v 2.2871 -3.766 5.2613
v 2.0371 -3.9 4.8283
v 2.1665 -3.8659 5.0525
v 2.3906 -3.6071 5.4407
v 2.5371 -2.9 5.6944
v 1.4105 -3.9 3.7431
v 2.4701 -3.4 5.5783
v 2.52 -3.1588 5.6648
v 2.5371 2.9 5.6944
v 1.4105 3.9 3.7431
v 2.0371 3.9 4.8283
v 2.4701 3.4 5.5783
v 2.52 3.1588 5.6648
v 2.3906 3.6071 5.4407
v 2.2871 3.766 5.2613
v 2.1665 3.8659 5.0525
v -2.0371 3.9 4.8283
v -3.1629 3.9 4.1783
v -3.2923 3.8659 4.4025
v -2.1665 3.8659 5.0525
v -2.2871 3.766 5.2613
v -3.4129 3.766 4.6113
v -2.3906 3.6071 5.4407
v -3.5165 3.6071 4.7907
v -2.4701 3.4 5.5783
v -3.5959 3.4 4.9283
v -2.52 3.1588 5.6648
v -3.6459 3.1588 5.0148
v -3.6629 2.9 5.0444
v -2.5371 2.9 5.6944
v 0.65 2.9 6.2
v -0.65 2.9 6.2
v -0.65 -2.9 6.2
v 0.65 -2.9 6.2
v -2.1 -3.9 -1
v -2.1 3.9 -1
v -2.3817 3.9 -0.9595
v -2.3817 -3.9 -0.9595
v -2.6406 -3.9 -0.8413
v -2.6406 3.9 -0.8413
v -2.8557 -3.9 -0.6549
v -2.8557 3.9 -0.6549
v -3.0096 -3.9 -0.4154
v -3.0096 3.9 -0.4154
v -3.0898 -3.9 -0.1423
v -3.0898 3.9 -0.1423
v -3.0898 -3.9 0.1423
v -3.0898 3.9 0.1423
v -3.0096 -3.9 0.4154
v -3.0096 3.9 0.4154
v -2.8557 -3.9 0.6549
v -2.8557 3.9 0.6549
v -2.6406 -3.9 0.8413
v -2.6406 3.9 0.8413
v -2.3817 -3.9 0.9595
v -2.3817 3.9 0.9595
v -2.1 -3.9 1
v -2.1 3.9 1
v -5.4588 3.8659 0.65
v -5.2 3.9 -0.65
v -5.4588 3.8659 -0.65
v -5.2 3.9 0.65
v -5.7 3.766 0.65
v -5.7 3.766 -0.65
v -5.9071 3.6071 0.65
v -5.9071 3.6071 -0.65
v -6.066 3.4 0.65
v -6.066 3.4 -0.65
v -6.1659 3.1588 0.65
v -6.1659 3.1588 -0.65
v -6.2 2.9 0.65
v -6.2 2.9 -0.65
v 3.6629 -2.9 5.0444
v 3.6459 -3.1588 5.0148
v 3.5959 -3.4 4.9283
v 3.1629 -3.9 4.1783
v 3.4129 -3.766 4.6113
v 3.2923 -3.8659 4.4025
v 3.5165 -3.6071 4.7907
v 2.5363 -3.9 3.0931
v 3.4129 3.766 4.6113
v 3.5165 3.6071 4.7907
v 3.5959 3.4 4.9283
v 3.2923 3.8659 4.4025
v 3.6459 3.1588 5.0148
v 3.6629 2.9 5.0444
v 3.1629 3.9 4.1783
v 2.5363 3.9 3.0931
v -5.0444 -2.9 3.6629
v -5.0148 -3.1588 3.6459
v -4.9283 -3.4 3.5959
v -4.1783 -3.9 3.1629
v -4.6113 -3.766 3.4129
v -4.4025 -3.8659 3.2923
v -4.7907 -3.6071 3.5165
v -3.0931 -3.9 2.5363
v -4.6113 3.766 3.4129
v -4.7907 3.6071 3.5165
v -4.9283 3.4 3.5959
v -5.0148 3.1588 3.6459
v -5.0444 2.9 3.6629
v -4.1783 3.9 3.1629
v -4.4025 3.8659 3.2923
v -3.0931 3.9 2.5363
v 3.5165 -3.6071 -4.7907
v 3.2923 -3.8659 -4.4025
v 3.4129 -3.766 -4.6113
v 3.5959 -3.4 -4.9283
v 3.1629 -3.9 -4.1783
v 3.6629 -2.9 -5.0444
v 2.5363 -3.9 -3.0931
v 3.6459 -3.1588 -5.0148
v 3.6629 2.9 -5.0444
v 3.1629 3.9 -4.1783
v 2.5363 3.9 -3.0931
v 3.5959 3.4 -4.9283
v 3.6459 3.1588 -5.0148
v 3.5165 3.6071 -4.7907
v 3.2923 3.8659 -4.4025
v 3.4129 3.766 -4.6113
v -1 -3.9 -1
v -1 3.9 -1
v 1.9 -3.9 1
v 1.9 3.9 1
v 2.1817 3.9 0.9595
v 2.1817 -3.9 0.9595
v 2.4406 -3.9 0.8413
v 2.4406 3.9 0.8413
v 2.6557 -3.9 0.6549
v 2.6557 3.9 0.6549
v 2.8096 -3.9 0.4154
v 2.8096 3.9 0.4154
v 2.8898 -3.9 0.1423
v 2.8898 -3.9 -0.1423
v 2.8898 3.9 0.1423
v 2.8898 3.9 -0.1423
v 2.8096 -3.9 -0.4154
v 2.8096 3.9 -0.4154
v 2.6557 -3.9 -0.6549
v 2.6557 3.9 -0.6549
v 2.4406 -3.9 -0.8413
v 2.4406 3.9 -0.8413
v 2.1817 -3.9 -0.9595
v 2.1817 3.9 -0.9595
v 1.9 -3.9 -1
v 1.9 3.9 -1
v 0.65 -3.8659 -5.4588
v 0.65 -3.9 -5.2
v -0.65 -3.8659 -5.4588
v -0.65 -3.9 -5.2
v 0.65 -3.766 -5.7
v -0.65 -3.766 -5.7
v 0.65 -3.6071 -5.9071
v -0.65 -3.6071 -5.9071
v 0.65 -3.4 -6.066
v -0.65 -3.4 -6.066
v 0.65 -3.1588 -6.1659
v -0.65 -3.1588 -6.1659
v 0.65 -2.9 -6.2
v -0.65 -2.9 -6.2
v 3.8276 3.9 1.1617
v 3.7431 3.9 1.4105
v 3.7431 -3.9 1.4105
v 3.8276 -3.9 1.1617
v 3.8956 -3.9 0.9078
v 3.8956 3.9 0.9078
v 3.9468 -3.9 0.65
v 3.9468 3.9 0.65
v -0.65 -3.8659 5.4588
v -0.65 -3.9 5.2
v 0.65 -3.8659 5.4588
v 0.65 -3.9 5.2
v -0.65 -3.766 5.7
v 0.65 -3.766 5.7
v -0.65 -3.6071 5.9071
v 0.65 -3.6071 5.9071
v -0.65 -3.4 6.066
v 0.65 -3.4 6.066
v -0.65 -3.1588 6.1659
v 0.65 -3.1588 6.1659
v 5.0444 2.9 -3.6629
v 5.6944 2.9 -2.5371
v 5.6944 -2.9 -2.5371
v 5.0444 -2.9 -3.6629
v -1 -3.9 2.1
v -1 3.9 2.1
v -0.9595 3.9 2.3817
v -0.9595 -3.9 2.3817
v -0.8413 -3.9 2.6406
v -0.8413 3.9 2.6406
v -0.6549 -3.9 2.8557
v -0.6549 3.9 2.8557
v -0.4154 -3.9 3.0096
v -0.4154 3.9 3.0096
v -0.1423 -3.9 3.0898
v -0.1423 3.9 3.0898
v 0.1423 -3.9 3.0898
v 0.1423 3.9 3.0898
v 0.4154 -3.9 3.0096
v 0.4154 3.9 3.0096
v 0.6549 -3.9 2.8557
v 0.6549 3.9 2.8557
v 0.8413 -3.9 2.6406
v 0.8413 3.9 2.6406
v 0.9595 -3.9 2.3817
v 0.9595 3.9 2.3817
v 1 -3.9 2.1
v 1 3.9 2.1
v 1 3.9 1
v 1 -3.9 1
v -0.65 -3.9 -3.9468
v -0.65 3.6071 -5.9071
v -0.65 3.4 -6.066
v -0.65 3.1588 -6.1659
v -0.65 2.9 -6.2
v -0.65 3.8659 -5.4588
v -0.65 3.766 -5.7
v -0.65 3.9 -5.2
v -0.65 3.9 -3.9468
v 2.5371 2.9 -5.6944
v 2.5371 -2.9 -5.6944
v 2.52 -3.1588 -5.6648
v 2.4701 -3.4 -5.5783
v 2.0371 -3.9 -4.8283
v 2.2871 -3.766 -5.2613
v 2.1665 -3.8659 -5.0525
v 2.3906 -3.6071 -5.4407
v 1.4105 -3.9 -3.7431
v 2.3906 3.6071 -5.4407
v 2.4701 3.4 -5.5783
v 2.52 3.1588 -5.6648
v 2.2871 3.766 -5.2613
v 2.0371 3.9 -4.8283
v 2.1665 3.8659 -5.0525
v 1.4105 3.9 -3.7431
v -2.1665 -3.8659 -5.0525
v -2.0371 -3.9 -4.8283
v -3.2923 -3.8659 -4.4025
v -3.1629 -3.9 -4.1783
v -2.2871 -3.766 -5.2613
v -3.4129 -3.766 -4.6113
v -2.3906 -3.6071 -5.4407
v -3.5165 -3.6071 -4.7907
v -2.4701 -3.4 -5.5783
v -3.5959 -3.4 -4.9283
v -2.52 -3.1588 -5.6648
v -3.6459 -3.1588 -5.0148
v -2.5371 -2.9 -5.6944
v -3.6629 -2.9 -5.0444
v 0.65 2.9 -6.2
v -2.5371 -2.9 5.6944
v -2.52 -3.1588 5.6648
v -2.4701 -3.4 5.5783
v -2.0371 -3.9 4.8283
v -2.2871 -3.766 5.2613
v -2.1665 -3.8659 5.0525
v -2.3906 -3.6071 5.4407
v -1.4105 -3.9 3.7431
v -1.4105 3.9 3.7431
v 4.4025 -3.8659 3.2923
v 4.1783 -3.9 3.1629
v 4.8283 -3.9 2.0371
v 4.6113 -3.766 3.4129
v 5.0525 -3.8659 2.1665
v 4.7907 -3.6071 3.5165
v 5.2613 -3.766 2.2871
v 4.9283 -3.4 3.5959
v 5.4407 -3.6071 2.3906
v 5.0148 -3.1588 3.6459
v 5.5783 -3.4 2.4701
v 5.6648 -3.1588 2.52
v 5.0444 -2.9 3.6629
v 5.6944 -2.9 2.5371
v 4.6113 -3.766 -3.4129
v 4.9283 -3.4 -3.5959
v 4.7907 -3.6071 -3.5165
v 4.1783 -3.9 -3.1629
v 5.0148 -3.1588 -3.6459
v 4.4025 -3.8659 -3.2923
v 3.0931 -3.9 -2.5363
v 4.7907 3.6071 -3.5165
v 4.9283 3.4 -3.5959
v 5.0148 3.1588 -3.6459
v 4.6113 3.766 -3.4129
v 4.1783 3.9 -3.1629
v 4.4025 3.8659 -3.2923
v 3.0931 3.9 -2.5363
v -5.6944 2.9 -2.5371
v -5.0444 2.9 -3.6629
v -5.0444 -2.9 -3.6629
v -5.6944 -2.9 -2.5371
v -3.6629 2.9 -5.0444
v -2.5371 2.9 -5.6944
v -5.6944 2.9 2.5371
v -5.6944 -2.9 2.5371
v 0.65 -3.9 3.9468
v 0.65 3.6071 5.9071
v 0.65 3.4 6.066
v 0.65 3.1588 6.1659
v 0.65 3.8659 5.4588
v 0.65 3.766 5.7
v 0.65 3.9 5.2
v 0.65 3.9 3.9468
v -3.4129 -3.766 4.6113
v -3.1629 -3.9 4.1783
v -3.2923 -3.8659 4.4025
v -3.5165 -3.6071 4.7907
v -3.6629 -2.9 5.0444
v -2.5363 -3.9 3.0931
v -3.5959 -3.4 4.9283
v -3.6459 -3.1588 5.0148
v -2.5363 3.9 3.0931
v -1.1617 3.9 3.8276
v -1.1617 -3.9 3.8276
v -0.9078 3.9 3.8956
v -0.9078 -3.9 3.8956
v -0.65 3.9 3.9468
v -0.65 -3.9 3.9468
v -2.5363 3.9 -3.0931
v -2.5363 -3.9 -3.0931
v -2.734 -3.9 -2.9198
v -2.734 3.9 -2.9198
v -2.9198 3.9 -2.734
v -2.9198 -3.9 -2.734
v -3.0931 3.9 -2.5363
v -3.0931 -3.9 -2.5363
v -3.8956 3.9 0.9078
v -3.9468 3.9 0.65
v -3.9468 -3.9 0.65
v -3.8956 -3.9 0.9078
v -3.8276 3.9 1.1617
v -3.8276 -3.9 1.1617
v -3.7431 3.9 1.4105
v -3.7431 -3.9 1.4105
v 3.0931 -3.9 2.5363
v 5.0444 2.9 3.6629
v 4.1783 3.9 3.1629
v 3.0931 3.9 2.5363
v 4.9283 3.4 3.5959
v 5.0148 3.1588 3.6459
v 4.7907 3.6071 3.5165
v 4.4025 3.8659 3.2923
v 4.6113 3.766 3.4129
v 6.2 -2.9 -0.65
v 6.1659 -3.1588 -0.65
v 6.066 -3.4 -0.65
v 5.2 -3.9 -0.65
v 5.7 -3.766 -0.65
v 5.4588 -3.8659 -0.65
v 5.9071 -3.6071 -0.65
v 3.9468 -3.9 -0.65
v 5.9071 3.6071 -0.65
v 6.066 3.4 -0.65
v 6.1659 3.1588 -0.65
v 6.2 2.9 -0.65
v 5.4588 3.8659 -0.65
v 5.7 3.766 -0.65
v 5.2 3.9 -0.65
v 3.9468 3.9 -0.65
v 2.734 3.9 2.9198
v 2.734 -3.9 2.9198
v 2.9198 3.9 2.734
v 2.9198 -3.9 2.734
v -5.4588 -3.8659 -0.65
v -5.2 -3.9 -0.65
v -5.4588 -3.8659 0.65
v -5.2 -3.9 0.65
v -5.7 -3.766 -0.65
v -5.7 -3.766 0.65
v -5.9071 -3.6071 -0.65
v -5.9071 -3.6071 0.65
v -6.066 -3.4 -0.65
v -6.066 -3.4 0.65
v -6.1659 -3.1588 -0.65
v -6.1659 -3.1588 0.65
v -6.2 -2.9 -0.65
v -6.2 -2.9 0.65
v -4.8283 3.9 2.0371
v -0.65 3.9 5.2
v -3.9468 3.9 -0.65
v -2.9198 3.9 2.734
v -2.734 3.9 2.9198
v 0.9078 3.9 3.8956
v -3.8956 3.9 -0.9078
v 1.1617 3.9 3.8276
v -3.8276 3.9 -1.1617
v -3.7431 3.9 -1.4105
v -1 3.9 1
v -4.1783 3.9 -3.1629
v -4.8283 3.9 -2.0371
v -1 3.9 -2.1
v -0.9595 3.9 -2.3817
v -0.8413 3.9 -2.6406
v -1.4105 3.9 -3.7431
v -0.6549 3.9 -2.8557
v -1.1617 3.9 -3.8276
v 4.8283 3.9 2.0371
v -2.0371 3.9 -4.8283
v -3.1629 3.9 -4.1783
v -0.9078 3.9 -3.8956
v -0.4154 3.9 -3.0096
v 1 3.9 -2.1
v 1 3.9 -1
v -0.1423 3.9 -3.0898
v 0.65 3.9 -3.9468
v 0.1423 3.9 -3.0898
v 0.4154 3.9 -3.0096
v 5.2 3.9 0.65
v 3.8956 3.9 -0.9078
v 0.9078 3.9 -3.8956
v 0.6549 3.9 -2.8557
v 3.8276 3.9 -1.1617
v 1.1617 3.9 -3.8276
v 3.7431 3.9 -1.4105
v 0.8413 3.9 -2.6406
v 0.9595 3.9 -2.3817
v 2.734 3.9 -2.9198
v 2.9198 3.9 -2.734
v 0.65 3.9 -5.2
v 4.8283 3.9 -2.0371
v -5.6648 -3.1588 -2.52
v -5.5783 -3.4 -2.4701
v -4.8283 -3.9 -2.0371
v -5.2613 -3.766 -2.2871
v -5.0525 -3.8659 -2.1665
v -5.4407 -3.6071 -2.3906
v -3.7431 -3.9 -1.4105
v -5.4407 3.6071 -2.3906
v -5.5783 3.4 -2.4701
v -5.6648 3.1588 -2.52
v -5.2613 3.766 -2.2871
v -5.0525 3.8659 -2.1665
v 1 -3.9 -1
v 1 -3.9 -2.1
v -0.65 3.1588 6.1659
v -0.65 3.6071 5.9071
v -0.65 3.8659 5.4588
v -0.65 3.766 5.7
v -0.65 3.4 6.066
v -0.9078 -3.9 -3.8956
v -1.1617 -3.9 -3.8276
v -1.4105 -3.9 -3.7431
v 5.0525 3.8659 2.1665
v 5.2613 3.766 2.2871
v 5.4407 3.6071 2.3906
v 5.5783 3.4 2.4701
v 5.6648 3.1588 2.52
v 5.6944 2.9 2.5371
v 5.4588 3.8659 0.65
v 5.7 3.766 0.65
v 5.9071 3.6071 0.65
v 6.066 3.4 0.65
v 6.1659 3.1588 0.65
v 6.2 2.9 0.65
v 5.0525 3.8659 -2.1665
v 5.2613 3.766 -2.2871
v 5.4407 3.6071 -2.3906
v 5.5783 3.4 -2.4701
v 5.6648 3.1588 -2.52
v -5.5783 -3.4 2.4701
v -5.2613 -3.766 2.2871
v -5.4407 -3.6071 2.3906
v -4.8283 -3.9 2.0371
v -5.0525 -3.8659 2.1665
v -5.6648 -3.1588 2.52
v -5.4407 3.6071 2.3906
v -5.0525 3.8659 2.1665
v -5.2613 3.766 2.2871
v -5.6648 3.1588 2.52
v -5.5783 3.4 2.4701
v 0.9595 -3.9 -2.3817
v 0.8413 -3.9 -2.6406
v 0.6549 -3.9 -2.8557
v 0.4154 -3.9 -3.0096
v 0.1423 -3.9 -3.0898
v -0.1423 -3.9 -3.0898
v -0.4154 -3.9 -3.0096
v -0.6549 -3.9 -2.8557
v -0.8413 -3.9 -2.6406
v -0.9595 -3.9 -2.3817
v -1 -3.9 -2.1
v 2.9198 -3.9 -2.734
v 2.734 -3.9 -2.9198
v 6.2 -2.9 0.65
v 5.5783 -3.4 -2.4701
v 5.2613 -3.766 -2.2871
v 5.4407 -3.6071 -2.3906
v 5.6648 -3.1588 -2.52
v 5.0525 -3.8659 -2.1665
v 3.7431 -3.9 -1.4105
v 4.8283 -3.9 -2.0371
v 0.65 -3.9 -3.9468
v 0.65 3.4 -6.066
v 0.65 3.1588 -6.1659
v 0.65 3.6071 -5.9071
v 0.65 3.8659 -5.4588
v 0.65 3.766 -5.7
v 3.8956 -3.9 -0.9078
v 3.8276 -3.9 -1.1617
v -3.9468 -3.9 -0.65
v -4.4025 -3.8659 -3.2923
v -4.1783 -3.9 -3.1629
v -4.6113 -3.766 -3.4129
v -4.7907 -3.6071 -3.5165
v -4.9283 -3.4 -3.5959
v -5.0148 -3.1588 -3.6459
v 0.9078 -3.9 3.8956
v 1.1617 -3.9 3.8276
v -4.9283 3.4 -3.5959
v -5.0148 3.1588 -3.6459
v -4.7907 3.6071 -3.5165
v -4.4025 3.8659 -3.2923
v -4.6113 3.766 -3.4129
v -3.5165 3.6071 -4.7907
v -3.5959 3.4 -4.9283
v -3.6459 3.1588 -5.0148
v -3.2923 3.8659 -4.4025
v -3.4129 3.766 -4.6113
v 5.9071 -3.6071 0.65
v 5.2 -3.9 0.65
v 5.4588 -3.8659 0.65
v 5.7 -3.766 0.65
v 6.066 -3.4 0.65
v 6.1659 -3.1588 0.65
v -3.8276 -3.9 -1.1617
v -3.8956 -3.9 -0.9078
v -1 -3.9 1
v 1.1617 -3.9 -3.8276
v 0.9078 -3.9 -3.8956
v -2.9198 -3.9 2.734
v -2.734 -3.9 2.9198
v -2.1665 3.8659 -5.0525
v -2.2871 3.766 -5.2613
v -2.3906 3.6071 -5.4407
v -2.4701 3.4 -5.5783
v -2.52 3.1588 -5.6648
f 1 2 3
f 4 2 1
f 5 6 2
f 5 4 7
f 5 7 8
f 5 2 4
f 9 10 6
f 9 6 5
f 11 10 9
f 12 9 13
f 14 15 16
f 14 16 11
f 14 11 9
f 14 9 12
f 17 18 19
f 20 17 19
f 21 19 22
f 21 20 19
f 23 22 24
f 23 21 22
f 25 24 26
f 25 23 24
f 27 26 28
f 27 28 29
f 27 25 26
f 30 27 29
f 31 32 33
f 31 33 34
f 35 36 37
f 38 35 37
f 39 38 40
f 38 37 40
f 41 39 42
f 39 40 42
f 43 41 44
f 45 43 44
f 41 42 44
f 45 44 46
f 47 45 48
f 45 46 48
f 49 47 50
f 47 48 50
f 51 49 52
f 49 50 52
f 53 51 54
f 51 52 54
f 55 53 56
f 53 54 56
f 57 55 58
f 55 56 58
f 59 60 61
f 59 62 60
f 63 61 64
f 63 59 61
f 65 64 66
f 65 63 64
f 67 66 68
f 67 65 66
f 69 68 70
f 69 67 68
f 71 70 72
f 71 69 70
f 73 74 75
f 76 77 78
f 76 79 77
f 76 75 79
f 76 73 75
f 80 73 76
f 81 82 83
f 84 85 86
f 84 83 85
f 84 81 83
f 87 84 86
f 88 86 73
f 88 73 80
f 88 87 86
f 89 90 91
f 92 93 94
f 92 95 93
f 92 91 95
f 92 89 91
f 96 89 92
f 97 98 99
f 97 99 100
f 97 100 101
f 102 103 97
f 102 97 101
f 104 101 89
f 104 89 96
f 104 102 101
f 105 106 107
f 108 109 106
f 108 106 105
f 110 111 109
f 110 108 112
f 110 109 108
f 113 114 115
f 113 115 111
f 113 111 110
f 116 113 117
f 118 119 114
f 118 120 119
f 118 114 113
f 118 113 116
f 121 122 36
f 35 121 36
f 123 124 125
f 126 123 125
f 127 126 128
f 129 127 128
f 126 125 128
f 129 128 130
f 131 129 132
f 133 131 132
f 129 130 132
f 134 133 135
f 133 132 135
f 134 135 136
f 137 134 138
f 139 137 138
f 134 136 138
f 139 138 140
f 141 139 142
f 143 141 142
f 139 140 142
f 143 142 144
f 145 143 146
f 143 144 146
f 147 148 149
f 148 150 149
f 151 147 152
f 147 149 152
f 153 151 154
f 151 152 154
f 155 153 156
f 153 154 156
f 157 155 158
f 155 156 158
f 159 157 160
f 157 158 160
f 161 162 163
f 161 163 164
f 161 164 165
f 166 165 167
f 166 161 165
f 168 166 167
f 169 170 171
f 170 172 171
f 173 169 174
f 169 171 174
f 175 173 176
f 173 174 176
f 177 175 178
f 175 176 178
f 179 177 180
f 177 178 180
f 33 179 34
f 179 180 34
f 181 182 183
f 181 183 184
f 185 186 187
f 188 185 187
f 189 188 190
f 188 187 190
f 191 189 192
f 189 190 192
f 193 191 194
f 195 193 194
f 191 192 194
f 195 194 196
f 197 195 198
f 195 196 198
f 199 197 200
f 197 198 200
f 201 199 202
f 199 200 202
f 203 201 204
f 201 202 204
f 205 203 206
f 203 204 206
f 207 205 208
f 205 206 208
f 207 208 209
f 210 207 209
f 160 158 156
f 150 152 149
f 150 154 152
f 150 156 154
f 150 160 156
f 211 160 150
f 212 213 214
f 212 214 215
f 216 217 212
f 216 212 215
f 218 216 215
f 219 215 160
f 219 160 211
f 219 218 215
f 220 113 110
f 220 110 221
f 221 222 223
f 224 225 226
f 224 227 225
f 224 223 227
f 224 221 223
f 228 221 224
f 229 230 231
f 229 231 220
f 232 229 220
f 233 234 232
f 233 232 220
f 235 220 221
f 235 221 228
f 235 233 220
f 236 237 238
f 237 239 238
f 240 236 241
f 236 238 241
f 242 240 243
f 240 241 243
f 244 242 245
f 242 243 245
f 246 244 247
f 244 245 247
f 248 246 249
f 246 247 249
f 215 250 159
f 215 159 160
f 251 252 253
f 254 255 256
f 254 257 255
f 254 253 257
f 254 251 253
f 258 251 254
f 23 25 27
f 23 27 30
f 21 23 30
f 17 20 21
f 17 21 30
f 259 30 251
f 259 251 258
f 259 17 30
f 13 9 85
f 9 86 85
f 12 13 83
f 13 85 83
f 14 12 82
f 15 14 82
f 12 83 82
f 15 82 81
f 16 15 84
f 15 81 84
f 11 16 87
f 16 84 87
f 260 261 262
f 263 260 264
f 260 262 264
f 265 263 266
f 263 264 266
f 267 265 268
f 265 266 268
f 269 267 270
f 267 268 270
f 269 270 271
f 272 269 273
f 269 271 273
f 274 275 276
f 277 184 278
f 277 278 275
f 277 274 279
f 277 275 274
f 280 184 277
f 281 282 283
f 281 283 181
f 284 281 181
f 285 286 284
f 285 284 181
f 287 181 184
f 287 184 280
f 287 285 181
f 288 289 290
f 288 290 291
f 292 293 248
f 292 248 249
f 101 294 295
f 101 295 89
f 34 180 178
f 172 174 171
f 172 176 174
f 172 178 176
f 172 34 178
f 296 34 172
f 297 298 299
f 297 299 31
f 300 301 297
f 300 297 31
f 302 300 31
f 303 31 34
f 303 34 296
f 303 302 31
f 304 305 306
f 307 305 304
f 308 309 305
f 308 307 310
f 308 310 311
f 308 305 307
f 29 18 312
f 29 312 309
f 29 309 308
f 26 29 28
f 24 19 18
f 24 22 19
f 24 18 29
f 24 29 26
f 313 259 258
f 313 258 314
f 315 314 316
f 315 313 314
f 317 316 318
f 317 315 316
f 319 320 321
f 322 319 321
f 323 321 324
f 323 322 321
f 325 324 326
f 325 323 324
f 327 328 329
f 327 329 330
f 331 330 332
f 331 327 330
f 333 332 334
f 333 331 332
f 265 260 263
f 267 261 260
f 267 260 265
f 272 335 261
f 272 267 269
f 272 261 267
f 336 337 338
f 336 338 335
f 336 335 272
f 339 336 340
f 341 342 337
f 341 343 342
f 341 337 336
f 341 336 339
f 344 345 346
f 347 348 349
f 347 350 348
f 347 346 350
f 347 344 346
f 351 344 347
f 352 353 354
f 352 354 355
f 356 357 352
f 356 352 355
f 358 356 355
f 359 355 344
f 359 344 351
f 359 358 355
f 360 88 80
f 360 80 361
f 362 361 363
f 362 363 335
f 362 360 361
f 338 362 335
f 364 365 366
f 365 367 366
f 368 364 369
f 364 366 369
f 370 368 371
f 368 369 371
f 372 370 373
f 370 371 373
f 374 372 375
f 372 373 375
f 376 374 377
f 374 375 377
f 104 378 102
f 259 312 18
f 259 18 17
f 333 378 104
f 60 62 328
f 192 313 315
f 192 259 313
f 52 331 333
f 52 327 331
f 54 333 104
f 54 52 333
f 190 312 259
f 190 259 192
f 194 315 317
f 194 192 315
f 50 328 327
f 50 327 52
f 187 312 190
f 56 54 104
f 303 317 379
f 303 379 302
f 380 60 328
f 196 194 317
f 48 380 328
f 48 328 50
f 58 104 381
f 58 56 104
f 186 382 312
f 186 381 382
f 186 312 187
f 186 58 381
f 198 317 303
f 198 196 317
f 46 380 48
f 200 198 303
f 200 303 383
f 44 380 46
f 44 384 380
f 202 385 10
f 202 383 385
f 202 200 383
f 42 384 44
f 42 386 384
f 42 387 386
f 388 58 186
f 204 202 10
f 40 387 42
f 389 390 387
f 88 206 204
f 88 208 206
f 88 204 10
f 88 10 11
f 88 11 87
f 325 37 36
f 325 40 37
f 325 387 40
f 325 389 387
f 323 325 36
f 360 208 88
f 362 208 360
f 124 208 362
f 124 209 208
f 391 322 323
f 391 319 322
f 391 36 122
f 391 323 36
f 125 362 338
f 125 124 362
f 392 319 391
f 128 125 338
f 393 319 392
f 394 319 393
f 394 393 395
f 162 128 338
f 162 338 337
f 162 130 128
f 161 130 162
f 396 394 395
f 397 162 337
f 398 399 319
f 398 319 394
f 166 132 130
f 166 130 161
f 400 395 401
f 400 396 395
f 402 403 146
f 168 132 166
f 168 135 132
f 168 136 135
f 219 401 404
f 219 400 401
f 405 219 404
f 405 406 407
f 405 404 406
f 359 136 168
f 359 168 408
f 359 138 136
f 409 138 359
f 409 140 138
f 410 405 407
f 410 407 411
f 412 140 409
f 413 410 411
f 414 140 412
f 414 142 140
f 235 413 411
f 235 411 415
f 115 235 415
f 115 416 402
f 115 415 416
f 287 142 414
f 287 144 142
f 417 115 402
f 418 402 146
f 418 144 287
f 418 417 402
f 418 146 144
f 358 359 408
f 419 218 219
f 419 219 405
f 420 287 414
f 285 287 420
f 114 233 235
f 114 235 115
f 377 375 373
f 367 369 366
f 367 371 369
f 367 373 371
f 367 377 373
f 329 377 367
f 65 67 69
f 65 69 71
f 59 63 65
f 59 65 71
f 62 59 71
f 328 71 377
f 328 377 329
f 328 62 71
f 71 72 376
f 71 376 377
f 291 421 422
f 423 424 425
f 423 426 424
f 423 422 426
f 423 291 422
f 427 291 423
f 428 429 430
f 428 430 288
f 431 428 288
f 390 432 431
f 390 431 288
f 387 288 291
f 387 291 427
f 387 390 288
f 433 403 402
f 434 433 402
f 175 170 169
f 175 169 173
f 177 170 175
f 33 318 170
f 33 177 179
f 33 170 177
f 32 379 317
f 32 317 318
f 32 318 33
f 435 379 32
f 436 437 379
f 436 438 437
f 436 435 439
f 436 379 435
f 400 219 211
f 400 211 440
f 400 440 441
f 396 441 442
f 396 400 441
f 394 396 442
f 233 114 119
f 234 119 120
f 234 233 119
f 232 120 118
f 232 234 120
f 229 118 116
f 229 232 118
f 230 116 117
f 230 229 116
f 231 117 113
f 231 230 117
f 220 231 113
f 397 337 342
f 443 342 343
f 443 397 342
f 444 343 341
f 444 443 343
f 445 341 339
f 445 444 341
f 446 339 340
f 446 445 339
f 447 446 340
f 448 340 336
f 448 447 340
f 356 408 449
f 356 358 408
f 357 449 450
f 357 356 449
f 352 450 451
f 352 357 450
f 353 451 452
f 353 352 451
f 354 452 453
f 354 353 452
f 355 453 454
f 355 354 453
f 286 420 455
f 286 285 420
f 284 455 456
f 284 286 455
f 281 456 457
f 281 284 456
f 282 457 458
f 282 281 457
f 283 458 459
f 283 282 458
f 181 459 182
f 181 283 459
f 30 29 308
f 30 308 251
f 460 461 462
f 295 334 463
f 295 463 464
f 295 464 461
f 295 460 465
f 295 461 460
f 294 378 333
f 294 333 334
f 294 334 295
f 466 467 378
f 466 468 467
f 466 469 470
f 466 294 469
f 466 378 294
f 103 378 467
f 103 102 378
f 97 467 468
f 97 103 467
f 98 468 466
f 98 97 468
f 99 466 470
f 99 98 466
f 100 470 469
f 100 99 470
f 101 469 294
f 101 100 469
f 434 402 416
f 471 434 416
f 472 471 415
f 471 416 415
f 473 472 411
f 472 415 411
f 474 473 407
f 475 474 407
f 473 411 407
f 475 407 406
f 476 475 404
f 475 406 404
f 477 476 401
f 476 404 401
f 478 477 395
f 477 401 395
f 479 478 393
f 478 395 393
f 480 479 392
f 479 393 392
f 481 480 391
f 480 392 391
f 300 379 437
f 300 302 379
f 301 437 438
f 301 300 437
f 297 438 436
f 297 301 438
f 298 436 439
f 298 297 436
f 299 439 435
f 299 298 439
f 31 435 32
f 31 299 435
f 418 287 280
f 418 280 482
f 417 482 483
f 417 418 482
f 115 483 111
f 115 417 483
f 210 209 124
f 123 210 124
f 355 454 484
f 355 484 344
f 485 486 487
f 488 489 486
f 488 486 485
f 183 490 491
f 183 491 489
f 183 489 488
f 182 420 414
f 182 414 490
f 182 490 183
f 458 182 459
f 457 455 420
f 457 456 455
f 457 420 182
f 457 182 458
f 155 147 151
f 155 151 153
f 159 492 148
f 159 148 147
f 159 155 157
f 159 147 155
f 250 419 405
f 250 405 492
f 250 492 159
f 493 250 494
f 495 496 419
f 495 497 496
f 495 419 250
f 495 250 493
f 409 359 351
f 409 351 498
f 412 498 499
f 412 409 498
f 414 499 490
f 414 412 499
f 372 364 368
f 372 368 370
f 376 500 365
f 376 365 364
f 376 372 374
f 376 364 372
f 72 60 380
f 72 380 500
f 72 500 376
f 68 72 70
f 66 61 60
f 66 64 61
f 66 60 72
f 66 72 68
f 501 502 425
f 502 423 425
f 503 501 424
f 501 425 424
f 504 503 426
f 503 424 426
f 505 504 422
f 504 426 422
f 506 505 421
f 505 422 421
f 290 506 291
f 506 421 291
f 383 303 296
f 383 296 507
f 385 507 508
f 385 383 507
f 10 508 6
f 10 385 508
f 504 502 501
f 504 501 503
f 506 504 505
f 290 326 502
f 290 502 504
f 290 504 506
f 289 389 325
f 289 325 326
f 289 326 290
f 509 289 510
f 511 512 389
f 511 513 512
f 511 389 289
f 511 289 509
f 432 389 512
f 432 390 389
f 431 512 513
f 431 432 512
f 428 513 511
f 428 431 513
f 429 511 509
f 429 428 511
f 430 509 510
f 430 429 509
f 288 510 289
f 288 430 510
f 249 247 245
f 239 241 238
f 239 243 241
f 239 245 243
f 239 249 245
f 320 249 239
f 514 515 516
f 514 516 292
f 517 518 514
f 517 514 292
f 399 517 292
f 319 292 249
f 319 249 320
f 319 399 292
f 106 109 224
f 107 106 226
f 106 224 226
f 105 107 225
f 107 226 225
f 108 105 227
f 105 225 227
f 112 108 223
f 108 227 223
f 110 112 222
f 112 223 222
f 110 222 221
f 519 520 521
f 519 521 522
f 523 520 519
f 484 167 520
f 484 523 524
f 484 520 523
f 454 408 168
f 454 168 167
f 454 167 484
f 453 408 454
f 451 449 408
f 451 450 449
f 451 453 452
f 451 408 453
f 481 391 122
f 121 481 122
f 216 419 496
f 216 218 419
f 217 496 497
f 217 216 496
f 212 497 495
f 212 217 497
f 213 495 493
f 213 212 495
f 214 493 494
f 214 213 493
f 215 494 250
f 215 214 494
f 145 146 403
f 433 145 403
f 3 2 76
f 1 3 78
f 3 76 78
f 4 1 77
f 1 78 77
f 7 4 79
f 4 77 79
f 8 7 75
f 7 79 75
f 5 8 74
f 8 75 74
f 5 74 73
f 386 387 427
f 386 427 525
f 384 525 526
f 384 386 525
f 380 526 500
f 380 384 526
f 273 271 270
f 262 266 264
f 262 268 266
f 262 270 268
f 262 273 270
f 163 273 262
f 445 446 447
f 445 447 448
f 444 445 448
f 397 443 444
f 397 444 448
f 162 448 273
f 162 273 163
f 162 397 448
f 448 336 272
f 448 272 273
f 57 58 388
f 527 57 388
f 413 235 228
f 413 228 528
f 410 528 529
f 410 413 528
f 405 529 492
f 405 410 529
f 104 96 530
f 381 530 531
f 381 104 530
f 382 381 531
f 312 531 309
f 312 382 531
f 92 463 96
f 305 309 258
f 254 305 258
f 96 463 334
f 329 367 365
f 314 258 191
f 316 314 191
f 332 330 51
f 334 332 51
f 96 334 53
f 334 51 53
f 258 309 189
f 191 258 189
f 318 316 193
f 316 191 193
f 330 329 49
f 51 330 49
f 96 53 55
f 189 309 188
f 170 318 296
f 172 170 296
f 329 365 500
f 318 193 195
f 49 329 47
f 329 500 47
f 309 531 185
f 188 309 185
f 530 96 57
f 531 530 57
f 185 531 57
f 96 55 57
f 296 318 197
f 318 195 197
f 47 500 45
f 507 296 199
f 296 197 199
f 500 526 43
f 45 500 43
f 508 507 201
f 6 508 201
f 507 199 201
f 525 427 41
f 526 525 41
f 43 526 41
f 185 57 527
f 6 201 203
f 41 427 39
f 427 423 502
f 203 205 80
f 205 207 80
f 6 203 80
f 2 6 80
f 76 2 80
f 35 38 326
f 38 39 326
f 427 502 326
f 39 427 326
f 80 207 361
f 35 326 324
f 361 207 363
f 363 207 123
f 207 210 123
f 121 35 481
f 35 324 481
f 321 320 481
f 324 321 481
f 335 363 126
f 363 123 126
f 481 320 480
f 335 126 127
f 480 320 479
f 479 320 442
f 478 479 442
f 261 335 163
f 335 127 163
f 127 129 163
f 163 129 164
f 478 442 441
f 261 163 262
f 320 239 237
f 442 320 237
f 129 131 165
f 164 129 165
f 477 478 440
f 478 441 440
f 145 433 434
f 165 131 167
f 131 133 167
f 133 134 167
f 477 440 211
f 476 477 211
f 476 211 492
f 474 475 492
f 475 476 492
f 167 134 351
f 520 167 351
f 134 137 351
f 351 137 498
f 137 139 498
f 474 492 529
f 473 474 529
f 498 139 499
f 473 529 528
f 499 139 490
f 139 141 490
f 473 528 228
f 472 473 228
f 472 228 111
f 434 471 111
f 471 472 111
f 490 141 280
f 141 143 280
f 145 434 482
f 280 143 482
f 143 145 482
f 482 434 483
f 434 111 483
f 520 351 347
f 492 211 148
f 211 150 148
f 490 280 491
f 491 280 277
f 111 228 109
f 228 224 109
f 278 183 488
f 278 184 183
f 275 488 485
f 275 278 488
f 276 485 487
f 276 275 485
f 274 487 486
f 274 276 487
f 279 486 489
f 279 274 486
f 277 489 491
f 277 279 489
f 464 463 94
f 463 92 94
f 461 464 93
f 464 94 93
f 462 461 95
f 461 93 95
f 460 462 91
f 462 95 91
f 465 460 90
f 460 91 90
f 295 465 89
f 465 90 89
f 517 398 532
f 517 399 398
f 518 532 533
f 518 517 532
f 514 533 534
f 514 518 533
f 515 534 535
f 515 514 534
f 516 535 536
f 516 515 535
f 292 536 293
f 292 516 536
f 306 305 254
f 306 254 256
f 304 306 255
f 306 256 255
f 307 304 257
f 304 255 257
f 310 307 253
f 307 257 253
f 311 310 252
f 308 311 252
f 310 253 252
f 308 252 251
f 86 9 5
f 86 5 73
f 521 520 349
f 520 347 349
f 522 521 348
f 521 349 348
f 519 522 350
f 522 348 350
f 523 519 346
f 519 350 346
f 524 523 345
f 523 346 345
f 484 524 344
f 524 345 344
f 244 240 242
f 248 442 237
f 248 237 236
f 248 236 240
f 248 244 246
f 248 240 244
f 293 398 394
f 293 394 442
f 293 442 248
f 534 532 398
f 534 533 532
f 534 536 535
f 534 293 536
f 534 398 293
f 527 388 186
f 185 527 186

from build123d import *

# Parameters (mm, degrees)
SKETCH1_R           = 4
BOSS_EXTRUDE1_DEPTH = 3.9
BOSS_EXTRUDE2_DEPTH = 7.8
CIRPATTERN1_COUNT   = 12
SKETCH7_W           = 2
SKETCH7_H           = 2
CUT_EXTRUDE2_DEPTH  = 8.8
FILLET4_R           = 1
FILLET5_R           = 1
FILLET6_R           = 1
FILLET7_R           = 1
FILLET8_R           = 1
FILLET9_R           = 1
FILLET10_R          = 1
FILLET11_R          = 1
FILLET12_R          = 1
FILLET13_R          = 1
FILLET14_R          = 1
FILLET15_R          = 1
FILLET16_R          = 1
FILLET17_R          = 1
FILLET18_R          = 1
FILLET19_R          = 1
FILLET20_R          = 1
FILLET21_R          = 1
FILLET22_R          = 1
FILLET23_R          = 1
FILLET24_R          = 1
FILLET25_R          = 1
FILLET26_R          = 1
FILLET27_R          = 1


with BuildPart() as part:
    # Sketch1 → Boss-Extrude1 (new body, symmetric)
    with BuildSketch(Plane(origin=(0, 0, 0), x_dir=(1, 0, 0), z_dir=(0, 1, 0))):
        Circle(SKETCH1_R)
    extrude(amount=BOSS_EXTRUDE1_DEPTH, both=True)

    # Sketch5 → Boss-Extrude2 (add)
    with BuildSketch(Plane(origin=(0, 3.9, 0), x_dir=(1, 0, 0), z_dir=(0, 1, 0))):
        with BuildLine():
            ThreePointArc((-0.65, 3.946834174), (-0.326085344, 3.986686387), (0, 4))
            Line((0, 4), (0, 6.2))
            Line((0, 6.2), (-0.65, 6.2))
            Line((-0.65, 6.2), (-0.65, 3.946834174))
        make_face()
        with BuildLine():
            Line((0, 6.2), (0, 4))
            ThreePointArc((0, 4), (0.326085344, 3.986686387), (0.65, 3.946834174))
            Line((0.65, 3.946834174), (0.65, 6.2))
            Line((0.65, 6.2), (0, 6.2))
        make_face()
    boss_extrude2 = extrude(amount=-BOSS_EXTRUDE2_DEPTH)

    # CirPattern1: Boss-Extrude2 ×12 about axis
    cirpattern1_axis = Axis((0, 0, 0), (0, 1, 0))
    for i in range(1, CIRPATTERN1_COUNT):
        add(boss_extrude2.rotate(cirpattern1_axis, i * 360 / CIRPATTERN1_COUNT))

    # Sketch7 → Cut-Extrude2 (cut, through all)
    with BuildSketch(Plane(origin=(0, 3.9, 0), x_dir=(1, 0, 0), z_dir=(0, 1, 0))):
        with BuildLine():
            Line((1, 1), (1, 2.1))
            ThreePointArc((1, 2.1), (0, 3.1), (-1, 2.1))
            Line((-1, 2.1), (-1, 1))
            Line((-1, 1), (1, 1))
        make_face()
        Rectangle(SKETCH7_W, SKETCH7_H)
        with BuildLine():
            Line((1.9, 1), (1, 1))
            Line((1, 1), (1, -1))
            Line((1, -1), (1.9, -1))
            ThreePointArc((1.9, -1), (2.9, 0), (1.9, 1))
        make_face()
        with BuildLine():
            Line((1, -2.1), (1, -1))
            Line((1, -1), (-1, -1))
            Line((-1, -1), (-1, -2.1))
            ThreePointArc((-1, -2.1), (0, -3.1), (1, -2.1))
        make_face()
        with BuildLine():
            Line((-1, -1), (-1, 1))
            Line((-1, 1), (-2.1, 1))
            ThreePointArc((-2.1, 1), (-3.1, 0), (-2.1, -1))
            Line((-2.1, -1), (-1, -1))
        make_face()
    extrude(amount=-CUT_EXTRUDE2_DEPTH, mode=Mode.SUBTRACT)

    # Fillet4
    fillet4_edges = [part.edges().sort_by_distance(p)[0] for p in [
        (3.1, 3.9, -5.369357503),
    ]]
    fillet(fillet4_edges, radius=FILLET4_R)

    # Fillet5
    fillet5_edges = [part.edges().sort_by_distance(p)[0] for p in [
        (5.369357503, 3.9, 3.1),
    ]]
    fillet(fillet5_edges, radius=FILLET5_R)

    # Fillet6
    fillet6_edges = [part.edges().sort_by_distance(p)[0] for p in [
        (6.2, 3.9, 0),
    ]]
    fillet(fillet6_edges, radius=FILLET6_R)

    # Fillet7
    fillet7_edges = [part.edges().sort_by_distance(p)[0] for p in [
        (5.369357503, -3.9, -3.1),
    ]]
    fillet(fillet7_edges, radius=FILLET7_R)

    # Fillet8
    fillet8_edges = [part.edges().sort_by_distance(p)[0] for p in [
        (3.1, -3.9, 5.369357503),
    ]]
    fillet(fillet8_edges, radius=FILLET8_R)

    # Fillet9
    fillet9_edges = [part.edges().sort_by_distance(p)[0] for p in [
        (3.1, 3.9, 5.369357503),
    ]]
    fillet(fillet9_edges, radius=FILLET9_R)

    # Fillet10
    fillet10_edges = [part.edges().sort_by_distance(p)[0] for p in [
        (0, 3.9, 6.2),
    ]]
    fillet(fillet10_edges, radius=FILLET10_R)

    # Fillet11
    fillet11_edges = [part.edges().sort_by_distance(p)[0] for p in [
        (-3.1, 3.9, 5.369357503),
    ]]
    fillet(fillet11_edges, radius=FILLET11_R)

    # Fillet12
    fillet12_edges = [part.edges().sort_by_distance(p)[0] for p in [
        (-5.369357503, 3.9, 3.1),
    ]]
    fillet(fillet12_edges, radius=FILLET12_R)

    # Fillet13
    fillet13_edges = [part.edges().sort_by_distance(p)[0] for p in [
        (-6.2, 3.9, 0),
    ]]
    fillet(fillet13_edges, radius=FILLET13_R)

    # Fillet14
    fillet14_edges = [part.edges().sort_by_distance(p)[0] for p in [
        (-3.1, 3.9, -5.369357503),
    ]]
    fillet(fillet14_edges, radius=FILLET14_R)

    # Fillet15
    fillet15_edges = [part.edges().sort_by_distance(p)[0] for p in [
        (-5.369357503, 3.9, -3.1),
    ]]
    fillet(fillet15_edges, radius=FILLET15_R)

    # Fillet16
    fillet16_edges = [part.edges().sort_by_distance(p)[0] for p in [
        (0, 3.9, -6.2),
    ]]
    fillet(fillet16_edges, radius=FILLET16_R)

    # Fillet17
    fillet17_edges = [part.edges().sort_by_distance(p)[0] for p in [
        (5.369357503, 3.9, -3.1),
    ]]
    fillet(fillet17_edges, radius=FILLET17_R)

    # Fillet18
    fillet18_edges = [part.edges().sort_by_distance(p)[0] for p in [
        (-6.2, -3.9, 0),
    ]]
    fillet(fillet18_edges, radius=FILLET18_R)

    # Fillet19
    fillet19_edges = [part.edges().sort_by_distance(p)[0] for p in [
        (-5.369357503, -3.9, 3.1),
    ]]
    fillet(fillet19_edges, radius=FILLET19_R)

    # Fillet20
    fillet20_edges = [part.edges().sort_by_distance(p)[0] for p in [
        (-3.1, -3.9, 5.369357503),
    ]]
    fillet(fillet20_edges, radius=FILLET20_R)

    # Fillet21
    fillet21_edges = [part.edges().sort_by_distance(p)[0] for p in [
        (0, -3.9, 6.2),
    ]]
    fillet(fillet21_edges, radius=FILLET21_R)

    # Fillet22
    fillet22_edges = [part.edges().sort_by_distance(p)[0] for p in [
        (5.369357503, -3.9, 3.1),
    ]]
    fillet(fillet22_edges, radius=FILLET22_R)

    # Fillet23
    fillet23_edges = [part.edges().sort_by_distance(p)[0] for p in [
        (6.2, -3.9, 0),
    ]]
    fillet(fillet23_edges, radius=FILLET23_R)

    # Fillet24
    fillet24_edges = [part.edges().sort_by_distance(p)[0] for p in [
        (0, -3.9, -6.2),
    ]]
    fillet(fillet24_edges, radius=FILLET24_R)

    # Fillet25
    fillet25_edges = [part.edges().sort_by_distance(p)[0] for p in [
        (-3.1, -3.9, -5.369357503),
    ]]
    fillet(fillet25_edges, radius=FILLET25_R)

    # Fillet26
    fillet26_edges = [part.edges().sort_by_distance(p)[0] for p in [
        (3.1, -3.9, -5.369357503),
    ]]
    fillet(fillet26_edges, radius=FILLET26_R)

    # Fillet27
    fillet27_edges = [part.edges().sort_by_distance(p)[0] for p in [
        (-5.369357503, -3.9, -3.1),
    ]]
    fillet(fillet27_edges, radius=FILLET27_R)


solid = part.part
